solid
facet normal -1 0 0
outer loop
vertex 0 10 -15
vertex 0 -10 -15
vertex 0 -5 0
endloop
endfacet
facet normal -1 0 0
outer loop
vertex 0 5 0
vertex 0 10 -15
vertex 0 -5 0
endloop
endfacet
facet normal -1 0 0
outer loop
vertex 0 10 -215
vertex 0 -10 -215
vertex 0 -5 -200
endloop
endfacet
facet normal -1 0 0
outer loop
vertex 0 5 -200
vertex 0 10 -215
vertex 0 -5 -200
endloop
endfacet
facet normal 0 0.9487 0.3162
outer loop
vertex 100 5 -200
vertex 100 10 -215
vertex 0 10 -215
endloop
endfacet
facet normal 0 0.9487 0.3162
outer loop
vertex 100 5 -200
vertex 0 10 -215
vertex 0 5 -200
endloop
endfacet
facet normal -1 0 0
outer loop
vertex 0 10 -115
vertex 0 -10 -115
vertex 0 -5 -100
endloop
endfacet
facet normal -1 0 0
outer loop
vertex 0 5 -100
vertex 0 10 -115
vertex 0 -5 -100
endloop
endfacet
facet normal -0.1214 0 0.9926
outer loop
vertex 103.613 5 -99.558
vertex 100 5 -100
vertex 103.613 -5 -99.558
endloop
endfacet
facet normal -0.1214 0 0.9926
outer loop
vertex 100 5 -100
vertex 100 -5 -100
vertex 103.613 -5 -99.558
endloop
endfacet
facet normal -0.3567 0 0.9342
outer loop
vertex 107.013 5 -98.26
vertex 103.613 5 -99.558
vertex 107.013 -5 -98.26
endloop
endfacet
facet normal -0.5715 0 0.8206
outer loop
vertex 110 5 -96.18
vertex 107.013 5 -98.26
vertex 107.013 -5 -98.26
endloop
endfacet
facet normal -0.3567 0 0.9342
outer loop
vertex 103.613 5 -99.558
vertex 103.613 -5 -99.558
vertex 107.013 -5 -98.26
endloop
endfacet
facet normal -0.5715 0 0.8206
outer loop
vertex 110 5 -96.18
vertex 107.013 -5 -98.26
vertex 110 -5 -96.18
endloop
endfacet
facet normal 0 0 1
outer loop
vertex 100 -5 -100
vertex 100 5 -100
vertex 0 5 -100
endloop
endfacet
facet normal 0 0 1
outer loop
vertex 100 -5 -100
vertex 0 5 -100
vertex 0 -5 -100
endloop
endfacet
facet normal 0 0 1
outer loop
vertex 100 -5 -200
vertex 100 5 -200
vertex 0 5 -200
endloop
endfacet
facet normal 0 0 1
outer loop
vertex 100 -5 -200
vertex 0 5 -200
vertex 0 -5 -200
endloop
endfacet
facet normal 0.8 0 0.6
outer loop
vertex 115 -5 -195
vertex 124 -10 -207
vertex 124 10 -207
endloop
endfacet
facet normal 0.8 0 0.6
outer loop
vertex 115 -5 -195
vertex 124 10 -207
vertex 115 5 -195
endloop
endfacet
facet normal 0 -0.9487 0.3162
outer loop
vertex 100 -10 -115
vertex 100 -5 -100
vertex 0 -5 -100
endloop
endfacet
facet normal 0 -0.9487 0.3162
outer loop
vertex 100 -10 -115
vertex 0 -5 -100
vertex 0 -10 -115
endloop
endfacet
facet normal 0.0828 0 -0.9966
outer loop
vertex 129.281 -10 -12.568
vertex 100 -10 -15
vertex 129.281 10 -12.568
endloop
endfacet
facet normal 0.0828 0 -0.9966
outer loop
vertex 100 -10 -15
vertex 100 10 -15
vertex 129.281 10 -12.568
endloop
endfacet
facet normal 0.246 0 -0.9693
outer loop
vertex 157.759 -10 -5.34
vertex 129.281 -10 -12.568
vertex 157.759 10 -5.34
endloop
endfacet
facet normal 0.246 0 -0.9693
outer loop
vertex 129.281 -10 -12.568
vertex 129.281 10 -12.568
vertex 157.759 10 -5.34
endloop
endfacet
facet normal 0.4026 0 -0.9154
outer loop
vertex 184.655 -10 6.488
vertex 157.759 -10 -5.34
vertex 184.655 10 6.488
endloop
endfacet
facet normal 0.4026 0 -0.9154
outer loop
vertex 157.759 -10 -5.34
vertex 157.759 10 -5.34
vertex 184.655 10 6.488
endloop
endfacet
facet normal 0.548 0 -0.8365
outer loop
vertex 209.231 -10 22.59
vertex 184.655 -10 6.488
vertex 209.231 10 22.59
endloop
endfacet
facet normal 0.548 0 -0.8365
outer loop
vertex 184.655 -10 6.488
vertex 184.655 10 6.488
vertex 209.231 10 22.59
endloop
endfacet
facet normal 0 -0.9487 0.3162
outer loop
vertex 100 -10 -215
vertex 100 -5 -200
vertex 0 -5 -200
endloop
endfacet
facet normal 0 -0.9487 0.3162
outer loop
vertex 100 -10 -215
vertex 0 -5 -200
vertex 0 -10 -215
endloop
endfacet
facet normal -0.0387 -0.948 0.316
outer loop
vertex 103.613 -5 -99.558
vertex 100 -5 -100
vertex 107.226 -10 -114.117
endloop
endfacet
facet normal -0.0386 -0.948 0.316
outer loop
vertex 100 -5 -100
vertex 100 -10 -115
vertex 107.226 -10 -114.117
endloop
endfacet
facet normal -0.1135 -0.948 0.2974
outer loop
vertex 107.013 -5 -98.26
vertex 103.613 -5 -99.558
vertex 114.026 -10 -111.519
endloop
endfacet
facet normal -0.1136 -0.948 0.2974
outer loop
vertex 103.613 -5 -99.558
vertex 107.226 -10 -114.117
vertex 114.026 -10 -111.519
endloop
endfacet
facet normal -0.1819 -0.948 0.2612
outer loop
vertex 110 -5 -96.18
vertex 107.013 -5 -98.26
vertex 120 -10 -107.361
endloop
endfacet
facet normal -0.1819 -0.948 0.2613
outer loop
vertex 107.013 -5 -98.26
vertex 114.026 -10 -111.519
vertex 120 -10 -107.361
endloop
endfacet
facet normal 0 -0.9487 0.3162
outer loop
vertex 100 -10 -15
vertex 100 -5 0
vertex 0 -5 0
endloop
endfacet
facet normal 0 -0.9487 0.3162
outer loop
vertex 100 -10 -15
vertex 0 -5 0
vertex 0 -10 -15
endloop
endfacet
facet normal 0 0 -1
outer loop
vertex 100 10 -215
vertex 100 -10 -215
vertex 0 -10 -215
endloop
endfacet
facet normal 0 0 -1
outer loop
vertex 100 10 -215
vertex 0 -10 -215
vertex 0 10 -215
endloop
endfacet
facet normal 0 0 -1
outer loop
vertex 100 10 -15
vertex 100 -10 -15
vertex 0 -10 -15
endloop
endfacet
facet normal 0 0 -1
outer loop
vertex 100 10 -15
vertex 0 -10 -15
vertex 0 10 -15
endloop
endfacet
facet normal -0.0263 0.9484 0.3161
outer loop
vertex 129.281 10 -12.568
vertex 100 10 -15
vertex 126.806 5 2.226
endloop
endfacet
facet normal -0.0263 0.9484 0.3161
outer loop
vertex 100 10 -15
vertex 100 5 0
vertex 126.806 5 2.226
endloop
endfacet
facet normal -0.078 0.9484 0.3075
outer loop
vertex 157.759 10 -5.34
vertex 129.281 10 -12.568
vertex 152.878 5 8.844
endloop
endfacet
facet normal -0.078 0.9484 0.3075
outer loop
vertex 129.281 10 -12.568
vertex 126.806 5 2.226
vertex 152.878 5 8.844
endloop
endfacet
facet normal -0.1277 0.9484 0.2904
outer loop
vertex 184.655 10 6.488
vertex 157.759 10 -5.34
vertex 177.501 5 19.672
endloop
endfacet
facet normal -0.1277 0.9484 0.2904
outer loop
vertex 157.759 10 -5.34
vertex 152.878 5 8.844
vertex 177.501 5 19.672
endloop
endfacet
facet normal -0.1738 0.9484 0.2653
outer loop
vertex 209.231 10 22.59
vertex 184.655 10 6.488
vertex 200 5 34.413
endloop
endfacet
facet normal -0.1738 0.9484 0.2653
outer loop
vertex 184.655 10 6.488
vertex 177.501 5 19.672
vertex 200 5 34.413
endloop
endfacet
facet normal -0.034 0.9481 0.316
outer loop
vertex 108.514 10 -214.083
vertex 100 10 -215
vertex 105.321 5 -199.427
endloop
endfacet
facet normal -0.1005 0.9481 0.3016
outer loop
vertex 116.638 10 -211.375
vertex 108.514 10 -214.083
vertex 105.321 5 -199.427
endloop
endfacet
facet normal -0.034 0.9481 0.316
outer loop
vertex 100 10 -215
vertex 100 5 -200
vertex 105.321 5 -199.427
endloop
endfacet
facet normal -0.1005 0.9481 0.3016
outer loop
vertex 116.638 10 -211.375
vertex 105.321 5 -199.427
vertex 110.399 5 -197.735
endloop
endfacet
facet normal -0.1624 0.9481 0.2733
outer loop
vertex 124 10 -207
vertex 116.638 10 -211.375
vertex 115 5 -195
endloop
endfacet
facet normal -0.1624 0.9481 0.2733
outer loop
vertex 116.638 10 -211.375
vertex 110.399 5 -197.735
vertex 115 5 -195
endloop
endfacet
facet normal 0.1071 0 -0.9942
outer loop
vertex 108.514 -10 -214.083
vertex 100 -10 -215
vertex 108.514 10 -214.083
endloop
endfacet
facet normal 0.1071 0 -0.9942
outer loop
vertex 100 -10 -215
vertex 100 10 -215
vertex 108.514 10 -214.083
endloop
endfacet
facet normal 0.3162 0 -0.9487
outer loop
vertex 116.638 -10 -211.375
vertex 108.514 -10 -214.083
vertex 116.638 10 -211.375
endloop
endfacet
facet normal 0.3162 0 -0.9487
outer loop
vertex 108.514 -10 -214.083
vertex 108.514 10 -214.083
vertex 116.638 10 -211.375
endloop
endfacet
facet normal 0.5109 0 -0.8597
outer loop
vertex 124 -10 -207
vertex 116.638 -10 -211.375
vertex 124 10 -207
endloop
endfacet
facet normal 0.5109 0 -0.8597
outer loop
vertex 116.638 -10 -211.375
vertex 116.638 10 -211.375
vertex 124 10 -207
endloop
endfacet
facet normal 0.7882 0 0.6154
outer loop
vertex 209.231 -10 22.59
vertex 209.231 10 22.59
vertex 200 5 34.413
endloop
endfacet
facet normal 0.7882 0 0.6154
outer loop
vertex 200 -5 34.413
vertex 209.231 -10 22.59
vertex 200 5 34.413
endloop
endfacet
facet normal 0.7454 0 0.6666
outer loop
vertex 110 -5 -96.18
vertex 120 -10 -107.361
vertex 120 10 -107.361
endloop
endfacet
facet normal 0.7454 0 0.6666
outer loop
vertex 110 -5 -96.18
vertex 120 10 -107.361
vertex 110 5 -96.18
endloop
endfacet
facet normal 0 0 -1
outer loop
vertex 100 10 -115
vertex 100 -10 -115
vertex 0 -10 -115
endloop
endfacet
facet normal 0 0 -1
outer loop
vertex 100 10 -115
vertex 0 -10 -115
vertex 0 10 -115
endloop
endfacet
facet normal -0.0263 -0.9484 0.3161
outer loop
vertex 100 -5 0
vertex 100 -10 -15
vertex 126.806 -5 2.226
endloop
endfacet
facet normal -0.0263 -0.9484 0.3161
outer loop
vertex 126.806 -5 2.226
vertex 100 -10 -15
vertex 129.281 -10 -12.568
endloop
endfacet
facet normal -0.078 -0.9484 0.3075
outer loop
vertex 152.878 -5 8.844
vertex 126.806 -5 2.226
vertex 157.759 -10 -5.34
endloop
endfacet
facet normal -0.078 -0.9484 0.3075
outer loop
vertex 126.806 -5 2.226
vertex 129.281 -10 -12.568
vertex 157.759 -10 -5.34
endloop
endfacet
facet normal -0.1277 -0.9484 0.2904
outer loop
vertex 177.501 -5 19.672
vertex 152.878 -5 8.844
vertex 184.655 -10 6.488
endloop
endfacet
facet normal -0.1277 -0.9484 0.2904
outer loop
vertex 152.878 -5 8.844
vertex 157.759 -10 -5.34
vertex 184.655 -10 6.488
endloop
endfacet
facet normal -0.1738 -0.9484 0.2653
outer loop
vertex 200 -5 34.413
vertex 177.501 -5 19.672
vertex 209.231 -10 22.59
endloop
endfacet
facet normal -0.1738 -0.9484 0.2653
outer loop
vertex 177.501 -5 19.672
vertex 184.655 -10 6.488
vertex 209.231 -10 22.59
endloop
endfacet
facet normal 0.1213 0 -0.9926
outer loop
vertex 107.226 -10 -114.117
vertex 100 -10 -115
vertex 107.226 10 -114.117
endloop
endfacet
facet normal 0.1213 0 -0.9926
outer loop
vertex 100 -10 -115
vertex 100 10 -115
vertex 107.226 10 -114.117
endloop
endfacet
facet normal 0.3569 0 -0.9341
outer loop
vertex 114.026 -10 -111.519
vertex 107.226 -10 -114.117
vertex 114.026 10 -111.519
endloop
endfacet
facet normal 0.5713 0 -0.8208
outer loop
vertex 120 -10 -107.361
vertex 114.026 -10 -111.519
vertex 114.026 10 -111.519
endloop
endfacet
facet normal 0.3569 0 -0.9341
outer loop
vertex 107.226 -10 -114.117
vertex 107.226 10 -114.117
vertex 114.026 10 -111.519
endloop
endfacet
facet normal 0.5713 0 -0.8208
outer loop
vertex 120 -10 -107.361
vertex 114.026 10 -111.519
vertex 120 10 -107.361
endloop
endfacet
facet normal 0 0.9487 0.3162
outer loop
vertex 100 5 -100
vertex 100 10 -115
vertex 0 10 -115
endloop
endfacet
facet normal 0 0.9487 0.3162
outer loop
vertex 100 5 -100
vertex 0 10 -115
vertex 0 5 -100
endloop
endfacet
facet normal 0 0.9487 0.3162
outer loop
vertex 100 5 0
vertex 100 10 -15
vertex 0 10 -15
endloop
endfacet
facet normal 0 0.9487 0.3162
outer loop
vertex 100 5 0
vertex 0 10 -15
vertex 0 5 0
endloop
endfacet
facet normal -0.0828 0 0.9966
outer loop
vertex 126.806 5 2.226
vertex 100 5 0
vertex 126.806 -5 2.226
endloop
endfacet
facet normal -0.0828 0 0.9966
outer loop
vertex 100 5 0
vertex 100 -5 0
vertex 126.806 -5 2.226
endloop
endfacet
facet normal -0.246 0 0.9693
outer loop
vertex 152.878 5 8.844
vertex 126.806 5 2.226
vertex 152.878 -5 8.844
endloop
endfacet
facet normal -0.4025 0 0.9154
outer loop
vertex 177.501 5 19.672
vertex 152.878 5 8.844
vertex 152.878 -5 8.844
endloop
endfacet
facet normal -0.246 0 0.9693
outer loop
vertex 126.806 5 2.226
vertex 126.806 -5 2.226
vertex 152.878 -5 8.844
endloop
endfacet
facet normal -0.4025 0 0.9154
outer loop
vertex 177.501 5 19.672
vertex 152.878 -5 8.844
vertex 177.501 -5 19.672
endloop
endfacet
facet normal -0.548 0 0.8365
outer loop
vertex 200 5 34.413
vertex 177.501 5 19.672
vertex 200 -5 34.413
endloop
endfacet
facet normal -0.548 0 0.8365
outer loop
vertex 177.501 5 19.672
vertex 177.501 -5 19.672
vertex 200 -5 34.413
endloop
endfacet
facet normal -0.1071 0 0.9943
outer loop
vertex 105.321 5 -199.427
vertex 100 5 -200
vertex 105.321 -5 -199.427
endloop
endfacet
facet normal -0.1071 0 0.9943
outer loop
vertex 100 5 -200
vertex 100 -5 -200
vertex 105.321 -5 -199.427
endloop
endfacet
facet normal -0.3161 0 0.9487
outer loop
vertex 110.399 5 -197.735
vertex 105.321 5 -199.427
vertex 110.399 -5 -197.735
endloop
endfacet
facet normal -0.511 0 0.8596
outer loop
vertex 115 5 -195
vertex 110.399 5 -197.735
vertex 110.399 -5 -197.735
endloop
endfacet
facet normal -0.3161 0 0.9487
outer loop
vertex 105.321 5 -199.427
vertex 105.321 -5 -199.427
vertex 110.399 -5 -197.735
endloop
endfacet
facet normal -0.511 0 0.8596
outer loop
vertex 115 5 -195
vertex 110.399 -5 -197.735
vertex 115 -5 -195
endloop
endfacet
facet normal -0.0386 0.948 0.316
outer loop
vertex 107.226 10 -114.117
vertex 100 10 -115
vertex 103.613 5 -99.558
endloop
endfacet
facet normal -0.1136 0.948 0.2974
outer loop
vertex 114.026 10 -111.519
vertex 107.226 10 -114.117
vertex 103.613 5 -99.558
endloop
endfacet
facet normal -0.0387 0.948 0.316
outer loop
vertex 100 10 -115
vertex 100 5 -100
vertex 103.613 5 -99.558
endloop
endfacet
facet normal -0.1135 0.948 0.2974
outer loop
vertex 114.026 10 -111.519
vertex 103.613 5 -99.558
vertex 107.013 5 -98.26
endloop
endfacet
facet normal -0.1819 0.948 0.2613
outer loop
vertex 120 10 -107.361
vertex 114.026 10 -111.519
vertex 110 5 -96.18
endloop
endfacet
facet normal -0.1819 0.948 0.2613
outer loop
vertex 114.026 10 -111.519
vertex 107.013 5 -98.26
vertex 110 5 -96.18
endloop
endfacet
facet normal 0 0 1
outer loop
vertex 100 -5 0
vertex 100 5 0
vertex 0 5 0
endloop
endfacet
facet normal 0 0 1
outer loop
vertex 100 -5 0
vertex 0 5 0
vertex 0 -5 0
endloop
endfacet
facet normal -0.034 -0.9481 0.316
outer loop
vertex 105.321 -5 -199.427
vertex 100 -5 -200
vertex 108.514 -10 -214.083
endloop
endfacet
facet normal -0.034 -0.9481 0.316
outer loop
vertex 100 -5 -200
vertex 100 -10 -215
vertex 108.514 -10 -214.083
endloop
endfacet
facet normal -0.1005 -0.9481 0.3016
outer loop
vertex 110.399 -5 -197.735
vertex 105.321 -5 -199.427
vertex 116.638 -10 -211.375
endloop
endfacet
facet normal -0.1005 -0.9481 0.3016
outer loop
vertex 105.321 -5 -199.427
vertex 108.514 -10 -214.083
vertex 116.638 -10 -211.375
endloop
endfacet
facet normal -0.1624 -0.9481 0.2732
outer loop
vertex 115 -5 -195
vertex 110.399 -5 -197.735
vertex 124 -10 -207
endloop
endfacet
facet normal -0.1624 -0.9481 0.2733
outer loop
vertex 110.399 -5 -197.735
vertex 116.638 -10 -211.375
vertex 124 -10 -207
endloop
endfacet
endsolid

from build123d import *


with BuildPart() as f2:
    # F2: sweep along a path in F0
    with BuildLine(Plane.XZ) as f2_path:
        Line((0, -200), (100, -200))
        ThreePointArc((100, -200), (107.9056941504, -198.7170824513), (115, -195))
    # F1 (on Right) → F2 (sweep)
    with BuildSketch(Plane.YZ):
        Polygon((5, -200), (0, -200), (-5, -200), (-10, -215), (10, -215), align=None)
    sweep(path=f2_path.line)


with BuildPart() as f3:
    # F3: sweep along a path in F0
    with BuildLine(Plane.XZ) as f3_path:
        Line((0, -100), (100, -100))
        ThreePointArc((100, -100), (105.3523313466, -99.0125853844), (110, -96.1803398875))
    # F1 (on Right) → F3 (sweep)
    with BuildSketch(Plane.YZ):
        Polygon((5, -100), (0, -100), (0, -115), (10, -115), align=None)
        Polygon((0, -115), (0, -100), (-5, -100), (-10, -115), align=None)
    sweep(path=f3_path.line)


with BuildPart() as f4:
    # F4: sweep along a path in F0
    with BuildLine(Plane.XZ) as f4_path:
        Line((0, 0), (100, 0))
        ThreePointArc((100, 0), (152.8778368347, 8.8439413115), (200, 34.4131154255))
    # F1 (on Right) → F4 (sweep)
    with BuildSketch(Plane.YZ):
        Polygon((0, -15), (0, 0), (-5, 0), (-10, -15), align=None)
        Polygon((5, 0), (0, 0), (0, -15), (10, -15), align=None)
    sweep(path=f4_path.line)


solid = Compound([f2.part, f3.part, f4.part])
